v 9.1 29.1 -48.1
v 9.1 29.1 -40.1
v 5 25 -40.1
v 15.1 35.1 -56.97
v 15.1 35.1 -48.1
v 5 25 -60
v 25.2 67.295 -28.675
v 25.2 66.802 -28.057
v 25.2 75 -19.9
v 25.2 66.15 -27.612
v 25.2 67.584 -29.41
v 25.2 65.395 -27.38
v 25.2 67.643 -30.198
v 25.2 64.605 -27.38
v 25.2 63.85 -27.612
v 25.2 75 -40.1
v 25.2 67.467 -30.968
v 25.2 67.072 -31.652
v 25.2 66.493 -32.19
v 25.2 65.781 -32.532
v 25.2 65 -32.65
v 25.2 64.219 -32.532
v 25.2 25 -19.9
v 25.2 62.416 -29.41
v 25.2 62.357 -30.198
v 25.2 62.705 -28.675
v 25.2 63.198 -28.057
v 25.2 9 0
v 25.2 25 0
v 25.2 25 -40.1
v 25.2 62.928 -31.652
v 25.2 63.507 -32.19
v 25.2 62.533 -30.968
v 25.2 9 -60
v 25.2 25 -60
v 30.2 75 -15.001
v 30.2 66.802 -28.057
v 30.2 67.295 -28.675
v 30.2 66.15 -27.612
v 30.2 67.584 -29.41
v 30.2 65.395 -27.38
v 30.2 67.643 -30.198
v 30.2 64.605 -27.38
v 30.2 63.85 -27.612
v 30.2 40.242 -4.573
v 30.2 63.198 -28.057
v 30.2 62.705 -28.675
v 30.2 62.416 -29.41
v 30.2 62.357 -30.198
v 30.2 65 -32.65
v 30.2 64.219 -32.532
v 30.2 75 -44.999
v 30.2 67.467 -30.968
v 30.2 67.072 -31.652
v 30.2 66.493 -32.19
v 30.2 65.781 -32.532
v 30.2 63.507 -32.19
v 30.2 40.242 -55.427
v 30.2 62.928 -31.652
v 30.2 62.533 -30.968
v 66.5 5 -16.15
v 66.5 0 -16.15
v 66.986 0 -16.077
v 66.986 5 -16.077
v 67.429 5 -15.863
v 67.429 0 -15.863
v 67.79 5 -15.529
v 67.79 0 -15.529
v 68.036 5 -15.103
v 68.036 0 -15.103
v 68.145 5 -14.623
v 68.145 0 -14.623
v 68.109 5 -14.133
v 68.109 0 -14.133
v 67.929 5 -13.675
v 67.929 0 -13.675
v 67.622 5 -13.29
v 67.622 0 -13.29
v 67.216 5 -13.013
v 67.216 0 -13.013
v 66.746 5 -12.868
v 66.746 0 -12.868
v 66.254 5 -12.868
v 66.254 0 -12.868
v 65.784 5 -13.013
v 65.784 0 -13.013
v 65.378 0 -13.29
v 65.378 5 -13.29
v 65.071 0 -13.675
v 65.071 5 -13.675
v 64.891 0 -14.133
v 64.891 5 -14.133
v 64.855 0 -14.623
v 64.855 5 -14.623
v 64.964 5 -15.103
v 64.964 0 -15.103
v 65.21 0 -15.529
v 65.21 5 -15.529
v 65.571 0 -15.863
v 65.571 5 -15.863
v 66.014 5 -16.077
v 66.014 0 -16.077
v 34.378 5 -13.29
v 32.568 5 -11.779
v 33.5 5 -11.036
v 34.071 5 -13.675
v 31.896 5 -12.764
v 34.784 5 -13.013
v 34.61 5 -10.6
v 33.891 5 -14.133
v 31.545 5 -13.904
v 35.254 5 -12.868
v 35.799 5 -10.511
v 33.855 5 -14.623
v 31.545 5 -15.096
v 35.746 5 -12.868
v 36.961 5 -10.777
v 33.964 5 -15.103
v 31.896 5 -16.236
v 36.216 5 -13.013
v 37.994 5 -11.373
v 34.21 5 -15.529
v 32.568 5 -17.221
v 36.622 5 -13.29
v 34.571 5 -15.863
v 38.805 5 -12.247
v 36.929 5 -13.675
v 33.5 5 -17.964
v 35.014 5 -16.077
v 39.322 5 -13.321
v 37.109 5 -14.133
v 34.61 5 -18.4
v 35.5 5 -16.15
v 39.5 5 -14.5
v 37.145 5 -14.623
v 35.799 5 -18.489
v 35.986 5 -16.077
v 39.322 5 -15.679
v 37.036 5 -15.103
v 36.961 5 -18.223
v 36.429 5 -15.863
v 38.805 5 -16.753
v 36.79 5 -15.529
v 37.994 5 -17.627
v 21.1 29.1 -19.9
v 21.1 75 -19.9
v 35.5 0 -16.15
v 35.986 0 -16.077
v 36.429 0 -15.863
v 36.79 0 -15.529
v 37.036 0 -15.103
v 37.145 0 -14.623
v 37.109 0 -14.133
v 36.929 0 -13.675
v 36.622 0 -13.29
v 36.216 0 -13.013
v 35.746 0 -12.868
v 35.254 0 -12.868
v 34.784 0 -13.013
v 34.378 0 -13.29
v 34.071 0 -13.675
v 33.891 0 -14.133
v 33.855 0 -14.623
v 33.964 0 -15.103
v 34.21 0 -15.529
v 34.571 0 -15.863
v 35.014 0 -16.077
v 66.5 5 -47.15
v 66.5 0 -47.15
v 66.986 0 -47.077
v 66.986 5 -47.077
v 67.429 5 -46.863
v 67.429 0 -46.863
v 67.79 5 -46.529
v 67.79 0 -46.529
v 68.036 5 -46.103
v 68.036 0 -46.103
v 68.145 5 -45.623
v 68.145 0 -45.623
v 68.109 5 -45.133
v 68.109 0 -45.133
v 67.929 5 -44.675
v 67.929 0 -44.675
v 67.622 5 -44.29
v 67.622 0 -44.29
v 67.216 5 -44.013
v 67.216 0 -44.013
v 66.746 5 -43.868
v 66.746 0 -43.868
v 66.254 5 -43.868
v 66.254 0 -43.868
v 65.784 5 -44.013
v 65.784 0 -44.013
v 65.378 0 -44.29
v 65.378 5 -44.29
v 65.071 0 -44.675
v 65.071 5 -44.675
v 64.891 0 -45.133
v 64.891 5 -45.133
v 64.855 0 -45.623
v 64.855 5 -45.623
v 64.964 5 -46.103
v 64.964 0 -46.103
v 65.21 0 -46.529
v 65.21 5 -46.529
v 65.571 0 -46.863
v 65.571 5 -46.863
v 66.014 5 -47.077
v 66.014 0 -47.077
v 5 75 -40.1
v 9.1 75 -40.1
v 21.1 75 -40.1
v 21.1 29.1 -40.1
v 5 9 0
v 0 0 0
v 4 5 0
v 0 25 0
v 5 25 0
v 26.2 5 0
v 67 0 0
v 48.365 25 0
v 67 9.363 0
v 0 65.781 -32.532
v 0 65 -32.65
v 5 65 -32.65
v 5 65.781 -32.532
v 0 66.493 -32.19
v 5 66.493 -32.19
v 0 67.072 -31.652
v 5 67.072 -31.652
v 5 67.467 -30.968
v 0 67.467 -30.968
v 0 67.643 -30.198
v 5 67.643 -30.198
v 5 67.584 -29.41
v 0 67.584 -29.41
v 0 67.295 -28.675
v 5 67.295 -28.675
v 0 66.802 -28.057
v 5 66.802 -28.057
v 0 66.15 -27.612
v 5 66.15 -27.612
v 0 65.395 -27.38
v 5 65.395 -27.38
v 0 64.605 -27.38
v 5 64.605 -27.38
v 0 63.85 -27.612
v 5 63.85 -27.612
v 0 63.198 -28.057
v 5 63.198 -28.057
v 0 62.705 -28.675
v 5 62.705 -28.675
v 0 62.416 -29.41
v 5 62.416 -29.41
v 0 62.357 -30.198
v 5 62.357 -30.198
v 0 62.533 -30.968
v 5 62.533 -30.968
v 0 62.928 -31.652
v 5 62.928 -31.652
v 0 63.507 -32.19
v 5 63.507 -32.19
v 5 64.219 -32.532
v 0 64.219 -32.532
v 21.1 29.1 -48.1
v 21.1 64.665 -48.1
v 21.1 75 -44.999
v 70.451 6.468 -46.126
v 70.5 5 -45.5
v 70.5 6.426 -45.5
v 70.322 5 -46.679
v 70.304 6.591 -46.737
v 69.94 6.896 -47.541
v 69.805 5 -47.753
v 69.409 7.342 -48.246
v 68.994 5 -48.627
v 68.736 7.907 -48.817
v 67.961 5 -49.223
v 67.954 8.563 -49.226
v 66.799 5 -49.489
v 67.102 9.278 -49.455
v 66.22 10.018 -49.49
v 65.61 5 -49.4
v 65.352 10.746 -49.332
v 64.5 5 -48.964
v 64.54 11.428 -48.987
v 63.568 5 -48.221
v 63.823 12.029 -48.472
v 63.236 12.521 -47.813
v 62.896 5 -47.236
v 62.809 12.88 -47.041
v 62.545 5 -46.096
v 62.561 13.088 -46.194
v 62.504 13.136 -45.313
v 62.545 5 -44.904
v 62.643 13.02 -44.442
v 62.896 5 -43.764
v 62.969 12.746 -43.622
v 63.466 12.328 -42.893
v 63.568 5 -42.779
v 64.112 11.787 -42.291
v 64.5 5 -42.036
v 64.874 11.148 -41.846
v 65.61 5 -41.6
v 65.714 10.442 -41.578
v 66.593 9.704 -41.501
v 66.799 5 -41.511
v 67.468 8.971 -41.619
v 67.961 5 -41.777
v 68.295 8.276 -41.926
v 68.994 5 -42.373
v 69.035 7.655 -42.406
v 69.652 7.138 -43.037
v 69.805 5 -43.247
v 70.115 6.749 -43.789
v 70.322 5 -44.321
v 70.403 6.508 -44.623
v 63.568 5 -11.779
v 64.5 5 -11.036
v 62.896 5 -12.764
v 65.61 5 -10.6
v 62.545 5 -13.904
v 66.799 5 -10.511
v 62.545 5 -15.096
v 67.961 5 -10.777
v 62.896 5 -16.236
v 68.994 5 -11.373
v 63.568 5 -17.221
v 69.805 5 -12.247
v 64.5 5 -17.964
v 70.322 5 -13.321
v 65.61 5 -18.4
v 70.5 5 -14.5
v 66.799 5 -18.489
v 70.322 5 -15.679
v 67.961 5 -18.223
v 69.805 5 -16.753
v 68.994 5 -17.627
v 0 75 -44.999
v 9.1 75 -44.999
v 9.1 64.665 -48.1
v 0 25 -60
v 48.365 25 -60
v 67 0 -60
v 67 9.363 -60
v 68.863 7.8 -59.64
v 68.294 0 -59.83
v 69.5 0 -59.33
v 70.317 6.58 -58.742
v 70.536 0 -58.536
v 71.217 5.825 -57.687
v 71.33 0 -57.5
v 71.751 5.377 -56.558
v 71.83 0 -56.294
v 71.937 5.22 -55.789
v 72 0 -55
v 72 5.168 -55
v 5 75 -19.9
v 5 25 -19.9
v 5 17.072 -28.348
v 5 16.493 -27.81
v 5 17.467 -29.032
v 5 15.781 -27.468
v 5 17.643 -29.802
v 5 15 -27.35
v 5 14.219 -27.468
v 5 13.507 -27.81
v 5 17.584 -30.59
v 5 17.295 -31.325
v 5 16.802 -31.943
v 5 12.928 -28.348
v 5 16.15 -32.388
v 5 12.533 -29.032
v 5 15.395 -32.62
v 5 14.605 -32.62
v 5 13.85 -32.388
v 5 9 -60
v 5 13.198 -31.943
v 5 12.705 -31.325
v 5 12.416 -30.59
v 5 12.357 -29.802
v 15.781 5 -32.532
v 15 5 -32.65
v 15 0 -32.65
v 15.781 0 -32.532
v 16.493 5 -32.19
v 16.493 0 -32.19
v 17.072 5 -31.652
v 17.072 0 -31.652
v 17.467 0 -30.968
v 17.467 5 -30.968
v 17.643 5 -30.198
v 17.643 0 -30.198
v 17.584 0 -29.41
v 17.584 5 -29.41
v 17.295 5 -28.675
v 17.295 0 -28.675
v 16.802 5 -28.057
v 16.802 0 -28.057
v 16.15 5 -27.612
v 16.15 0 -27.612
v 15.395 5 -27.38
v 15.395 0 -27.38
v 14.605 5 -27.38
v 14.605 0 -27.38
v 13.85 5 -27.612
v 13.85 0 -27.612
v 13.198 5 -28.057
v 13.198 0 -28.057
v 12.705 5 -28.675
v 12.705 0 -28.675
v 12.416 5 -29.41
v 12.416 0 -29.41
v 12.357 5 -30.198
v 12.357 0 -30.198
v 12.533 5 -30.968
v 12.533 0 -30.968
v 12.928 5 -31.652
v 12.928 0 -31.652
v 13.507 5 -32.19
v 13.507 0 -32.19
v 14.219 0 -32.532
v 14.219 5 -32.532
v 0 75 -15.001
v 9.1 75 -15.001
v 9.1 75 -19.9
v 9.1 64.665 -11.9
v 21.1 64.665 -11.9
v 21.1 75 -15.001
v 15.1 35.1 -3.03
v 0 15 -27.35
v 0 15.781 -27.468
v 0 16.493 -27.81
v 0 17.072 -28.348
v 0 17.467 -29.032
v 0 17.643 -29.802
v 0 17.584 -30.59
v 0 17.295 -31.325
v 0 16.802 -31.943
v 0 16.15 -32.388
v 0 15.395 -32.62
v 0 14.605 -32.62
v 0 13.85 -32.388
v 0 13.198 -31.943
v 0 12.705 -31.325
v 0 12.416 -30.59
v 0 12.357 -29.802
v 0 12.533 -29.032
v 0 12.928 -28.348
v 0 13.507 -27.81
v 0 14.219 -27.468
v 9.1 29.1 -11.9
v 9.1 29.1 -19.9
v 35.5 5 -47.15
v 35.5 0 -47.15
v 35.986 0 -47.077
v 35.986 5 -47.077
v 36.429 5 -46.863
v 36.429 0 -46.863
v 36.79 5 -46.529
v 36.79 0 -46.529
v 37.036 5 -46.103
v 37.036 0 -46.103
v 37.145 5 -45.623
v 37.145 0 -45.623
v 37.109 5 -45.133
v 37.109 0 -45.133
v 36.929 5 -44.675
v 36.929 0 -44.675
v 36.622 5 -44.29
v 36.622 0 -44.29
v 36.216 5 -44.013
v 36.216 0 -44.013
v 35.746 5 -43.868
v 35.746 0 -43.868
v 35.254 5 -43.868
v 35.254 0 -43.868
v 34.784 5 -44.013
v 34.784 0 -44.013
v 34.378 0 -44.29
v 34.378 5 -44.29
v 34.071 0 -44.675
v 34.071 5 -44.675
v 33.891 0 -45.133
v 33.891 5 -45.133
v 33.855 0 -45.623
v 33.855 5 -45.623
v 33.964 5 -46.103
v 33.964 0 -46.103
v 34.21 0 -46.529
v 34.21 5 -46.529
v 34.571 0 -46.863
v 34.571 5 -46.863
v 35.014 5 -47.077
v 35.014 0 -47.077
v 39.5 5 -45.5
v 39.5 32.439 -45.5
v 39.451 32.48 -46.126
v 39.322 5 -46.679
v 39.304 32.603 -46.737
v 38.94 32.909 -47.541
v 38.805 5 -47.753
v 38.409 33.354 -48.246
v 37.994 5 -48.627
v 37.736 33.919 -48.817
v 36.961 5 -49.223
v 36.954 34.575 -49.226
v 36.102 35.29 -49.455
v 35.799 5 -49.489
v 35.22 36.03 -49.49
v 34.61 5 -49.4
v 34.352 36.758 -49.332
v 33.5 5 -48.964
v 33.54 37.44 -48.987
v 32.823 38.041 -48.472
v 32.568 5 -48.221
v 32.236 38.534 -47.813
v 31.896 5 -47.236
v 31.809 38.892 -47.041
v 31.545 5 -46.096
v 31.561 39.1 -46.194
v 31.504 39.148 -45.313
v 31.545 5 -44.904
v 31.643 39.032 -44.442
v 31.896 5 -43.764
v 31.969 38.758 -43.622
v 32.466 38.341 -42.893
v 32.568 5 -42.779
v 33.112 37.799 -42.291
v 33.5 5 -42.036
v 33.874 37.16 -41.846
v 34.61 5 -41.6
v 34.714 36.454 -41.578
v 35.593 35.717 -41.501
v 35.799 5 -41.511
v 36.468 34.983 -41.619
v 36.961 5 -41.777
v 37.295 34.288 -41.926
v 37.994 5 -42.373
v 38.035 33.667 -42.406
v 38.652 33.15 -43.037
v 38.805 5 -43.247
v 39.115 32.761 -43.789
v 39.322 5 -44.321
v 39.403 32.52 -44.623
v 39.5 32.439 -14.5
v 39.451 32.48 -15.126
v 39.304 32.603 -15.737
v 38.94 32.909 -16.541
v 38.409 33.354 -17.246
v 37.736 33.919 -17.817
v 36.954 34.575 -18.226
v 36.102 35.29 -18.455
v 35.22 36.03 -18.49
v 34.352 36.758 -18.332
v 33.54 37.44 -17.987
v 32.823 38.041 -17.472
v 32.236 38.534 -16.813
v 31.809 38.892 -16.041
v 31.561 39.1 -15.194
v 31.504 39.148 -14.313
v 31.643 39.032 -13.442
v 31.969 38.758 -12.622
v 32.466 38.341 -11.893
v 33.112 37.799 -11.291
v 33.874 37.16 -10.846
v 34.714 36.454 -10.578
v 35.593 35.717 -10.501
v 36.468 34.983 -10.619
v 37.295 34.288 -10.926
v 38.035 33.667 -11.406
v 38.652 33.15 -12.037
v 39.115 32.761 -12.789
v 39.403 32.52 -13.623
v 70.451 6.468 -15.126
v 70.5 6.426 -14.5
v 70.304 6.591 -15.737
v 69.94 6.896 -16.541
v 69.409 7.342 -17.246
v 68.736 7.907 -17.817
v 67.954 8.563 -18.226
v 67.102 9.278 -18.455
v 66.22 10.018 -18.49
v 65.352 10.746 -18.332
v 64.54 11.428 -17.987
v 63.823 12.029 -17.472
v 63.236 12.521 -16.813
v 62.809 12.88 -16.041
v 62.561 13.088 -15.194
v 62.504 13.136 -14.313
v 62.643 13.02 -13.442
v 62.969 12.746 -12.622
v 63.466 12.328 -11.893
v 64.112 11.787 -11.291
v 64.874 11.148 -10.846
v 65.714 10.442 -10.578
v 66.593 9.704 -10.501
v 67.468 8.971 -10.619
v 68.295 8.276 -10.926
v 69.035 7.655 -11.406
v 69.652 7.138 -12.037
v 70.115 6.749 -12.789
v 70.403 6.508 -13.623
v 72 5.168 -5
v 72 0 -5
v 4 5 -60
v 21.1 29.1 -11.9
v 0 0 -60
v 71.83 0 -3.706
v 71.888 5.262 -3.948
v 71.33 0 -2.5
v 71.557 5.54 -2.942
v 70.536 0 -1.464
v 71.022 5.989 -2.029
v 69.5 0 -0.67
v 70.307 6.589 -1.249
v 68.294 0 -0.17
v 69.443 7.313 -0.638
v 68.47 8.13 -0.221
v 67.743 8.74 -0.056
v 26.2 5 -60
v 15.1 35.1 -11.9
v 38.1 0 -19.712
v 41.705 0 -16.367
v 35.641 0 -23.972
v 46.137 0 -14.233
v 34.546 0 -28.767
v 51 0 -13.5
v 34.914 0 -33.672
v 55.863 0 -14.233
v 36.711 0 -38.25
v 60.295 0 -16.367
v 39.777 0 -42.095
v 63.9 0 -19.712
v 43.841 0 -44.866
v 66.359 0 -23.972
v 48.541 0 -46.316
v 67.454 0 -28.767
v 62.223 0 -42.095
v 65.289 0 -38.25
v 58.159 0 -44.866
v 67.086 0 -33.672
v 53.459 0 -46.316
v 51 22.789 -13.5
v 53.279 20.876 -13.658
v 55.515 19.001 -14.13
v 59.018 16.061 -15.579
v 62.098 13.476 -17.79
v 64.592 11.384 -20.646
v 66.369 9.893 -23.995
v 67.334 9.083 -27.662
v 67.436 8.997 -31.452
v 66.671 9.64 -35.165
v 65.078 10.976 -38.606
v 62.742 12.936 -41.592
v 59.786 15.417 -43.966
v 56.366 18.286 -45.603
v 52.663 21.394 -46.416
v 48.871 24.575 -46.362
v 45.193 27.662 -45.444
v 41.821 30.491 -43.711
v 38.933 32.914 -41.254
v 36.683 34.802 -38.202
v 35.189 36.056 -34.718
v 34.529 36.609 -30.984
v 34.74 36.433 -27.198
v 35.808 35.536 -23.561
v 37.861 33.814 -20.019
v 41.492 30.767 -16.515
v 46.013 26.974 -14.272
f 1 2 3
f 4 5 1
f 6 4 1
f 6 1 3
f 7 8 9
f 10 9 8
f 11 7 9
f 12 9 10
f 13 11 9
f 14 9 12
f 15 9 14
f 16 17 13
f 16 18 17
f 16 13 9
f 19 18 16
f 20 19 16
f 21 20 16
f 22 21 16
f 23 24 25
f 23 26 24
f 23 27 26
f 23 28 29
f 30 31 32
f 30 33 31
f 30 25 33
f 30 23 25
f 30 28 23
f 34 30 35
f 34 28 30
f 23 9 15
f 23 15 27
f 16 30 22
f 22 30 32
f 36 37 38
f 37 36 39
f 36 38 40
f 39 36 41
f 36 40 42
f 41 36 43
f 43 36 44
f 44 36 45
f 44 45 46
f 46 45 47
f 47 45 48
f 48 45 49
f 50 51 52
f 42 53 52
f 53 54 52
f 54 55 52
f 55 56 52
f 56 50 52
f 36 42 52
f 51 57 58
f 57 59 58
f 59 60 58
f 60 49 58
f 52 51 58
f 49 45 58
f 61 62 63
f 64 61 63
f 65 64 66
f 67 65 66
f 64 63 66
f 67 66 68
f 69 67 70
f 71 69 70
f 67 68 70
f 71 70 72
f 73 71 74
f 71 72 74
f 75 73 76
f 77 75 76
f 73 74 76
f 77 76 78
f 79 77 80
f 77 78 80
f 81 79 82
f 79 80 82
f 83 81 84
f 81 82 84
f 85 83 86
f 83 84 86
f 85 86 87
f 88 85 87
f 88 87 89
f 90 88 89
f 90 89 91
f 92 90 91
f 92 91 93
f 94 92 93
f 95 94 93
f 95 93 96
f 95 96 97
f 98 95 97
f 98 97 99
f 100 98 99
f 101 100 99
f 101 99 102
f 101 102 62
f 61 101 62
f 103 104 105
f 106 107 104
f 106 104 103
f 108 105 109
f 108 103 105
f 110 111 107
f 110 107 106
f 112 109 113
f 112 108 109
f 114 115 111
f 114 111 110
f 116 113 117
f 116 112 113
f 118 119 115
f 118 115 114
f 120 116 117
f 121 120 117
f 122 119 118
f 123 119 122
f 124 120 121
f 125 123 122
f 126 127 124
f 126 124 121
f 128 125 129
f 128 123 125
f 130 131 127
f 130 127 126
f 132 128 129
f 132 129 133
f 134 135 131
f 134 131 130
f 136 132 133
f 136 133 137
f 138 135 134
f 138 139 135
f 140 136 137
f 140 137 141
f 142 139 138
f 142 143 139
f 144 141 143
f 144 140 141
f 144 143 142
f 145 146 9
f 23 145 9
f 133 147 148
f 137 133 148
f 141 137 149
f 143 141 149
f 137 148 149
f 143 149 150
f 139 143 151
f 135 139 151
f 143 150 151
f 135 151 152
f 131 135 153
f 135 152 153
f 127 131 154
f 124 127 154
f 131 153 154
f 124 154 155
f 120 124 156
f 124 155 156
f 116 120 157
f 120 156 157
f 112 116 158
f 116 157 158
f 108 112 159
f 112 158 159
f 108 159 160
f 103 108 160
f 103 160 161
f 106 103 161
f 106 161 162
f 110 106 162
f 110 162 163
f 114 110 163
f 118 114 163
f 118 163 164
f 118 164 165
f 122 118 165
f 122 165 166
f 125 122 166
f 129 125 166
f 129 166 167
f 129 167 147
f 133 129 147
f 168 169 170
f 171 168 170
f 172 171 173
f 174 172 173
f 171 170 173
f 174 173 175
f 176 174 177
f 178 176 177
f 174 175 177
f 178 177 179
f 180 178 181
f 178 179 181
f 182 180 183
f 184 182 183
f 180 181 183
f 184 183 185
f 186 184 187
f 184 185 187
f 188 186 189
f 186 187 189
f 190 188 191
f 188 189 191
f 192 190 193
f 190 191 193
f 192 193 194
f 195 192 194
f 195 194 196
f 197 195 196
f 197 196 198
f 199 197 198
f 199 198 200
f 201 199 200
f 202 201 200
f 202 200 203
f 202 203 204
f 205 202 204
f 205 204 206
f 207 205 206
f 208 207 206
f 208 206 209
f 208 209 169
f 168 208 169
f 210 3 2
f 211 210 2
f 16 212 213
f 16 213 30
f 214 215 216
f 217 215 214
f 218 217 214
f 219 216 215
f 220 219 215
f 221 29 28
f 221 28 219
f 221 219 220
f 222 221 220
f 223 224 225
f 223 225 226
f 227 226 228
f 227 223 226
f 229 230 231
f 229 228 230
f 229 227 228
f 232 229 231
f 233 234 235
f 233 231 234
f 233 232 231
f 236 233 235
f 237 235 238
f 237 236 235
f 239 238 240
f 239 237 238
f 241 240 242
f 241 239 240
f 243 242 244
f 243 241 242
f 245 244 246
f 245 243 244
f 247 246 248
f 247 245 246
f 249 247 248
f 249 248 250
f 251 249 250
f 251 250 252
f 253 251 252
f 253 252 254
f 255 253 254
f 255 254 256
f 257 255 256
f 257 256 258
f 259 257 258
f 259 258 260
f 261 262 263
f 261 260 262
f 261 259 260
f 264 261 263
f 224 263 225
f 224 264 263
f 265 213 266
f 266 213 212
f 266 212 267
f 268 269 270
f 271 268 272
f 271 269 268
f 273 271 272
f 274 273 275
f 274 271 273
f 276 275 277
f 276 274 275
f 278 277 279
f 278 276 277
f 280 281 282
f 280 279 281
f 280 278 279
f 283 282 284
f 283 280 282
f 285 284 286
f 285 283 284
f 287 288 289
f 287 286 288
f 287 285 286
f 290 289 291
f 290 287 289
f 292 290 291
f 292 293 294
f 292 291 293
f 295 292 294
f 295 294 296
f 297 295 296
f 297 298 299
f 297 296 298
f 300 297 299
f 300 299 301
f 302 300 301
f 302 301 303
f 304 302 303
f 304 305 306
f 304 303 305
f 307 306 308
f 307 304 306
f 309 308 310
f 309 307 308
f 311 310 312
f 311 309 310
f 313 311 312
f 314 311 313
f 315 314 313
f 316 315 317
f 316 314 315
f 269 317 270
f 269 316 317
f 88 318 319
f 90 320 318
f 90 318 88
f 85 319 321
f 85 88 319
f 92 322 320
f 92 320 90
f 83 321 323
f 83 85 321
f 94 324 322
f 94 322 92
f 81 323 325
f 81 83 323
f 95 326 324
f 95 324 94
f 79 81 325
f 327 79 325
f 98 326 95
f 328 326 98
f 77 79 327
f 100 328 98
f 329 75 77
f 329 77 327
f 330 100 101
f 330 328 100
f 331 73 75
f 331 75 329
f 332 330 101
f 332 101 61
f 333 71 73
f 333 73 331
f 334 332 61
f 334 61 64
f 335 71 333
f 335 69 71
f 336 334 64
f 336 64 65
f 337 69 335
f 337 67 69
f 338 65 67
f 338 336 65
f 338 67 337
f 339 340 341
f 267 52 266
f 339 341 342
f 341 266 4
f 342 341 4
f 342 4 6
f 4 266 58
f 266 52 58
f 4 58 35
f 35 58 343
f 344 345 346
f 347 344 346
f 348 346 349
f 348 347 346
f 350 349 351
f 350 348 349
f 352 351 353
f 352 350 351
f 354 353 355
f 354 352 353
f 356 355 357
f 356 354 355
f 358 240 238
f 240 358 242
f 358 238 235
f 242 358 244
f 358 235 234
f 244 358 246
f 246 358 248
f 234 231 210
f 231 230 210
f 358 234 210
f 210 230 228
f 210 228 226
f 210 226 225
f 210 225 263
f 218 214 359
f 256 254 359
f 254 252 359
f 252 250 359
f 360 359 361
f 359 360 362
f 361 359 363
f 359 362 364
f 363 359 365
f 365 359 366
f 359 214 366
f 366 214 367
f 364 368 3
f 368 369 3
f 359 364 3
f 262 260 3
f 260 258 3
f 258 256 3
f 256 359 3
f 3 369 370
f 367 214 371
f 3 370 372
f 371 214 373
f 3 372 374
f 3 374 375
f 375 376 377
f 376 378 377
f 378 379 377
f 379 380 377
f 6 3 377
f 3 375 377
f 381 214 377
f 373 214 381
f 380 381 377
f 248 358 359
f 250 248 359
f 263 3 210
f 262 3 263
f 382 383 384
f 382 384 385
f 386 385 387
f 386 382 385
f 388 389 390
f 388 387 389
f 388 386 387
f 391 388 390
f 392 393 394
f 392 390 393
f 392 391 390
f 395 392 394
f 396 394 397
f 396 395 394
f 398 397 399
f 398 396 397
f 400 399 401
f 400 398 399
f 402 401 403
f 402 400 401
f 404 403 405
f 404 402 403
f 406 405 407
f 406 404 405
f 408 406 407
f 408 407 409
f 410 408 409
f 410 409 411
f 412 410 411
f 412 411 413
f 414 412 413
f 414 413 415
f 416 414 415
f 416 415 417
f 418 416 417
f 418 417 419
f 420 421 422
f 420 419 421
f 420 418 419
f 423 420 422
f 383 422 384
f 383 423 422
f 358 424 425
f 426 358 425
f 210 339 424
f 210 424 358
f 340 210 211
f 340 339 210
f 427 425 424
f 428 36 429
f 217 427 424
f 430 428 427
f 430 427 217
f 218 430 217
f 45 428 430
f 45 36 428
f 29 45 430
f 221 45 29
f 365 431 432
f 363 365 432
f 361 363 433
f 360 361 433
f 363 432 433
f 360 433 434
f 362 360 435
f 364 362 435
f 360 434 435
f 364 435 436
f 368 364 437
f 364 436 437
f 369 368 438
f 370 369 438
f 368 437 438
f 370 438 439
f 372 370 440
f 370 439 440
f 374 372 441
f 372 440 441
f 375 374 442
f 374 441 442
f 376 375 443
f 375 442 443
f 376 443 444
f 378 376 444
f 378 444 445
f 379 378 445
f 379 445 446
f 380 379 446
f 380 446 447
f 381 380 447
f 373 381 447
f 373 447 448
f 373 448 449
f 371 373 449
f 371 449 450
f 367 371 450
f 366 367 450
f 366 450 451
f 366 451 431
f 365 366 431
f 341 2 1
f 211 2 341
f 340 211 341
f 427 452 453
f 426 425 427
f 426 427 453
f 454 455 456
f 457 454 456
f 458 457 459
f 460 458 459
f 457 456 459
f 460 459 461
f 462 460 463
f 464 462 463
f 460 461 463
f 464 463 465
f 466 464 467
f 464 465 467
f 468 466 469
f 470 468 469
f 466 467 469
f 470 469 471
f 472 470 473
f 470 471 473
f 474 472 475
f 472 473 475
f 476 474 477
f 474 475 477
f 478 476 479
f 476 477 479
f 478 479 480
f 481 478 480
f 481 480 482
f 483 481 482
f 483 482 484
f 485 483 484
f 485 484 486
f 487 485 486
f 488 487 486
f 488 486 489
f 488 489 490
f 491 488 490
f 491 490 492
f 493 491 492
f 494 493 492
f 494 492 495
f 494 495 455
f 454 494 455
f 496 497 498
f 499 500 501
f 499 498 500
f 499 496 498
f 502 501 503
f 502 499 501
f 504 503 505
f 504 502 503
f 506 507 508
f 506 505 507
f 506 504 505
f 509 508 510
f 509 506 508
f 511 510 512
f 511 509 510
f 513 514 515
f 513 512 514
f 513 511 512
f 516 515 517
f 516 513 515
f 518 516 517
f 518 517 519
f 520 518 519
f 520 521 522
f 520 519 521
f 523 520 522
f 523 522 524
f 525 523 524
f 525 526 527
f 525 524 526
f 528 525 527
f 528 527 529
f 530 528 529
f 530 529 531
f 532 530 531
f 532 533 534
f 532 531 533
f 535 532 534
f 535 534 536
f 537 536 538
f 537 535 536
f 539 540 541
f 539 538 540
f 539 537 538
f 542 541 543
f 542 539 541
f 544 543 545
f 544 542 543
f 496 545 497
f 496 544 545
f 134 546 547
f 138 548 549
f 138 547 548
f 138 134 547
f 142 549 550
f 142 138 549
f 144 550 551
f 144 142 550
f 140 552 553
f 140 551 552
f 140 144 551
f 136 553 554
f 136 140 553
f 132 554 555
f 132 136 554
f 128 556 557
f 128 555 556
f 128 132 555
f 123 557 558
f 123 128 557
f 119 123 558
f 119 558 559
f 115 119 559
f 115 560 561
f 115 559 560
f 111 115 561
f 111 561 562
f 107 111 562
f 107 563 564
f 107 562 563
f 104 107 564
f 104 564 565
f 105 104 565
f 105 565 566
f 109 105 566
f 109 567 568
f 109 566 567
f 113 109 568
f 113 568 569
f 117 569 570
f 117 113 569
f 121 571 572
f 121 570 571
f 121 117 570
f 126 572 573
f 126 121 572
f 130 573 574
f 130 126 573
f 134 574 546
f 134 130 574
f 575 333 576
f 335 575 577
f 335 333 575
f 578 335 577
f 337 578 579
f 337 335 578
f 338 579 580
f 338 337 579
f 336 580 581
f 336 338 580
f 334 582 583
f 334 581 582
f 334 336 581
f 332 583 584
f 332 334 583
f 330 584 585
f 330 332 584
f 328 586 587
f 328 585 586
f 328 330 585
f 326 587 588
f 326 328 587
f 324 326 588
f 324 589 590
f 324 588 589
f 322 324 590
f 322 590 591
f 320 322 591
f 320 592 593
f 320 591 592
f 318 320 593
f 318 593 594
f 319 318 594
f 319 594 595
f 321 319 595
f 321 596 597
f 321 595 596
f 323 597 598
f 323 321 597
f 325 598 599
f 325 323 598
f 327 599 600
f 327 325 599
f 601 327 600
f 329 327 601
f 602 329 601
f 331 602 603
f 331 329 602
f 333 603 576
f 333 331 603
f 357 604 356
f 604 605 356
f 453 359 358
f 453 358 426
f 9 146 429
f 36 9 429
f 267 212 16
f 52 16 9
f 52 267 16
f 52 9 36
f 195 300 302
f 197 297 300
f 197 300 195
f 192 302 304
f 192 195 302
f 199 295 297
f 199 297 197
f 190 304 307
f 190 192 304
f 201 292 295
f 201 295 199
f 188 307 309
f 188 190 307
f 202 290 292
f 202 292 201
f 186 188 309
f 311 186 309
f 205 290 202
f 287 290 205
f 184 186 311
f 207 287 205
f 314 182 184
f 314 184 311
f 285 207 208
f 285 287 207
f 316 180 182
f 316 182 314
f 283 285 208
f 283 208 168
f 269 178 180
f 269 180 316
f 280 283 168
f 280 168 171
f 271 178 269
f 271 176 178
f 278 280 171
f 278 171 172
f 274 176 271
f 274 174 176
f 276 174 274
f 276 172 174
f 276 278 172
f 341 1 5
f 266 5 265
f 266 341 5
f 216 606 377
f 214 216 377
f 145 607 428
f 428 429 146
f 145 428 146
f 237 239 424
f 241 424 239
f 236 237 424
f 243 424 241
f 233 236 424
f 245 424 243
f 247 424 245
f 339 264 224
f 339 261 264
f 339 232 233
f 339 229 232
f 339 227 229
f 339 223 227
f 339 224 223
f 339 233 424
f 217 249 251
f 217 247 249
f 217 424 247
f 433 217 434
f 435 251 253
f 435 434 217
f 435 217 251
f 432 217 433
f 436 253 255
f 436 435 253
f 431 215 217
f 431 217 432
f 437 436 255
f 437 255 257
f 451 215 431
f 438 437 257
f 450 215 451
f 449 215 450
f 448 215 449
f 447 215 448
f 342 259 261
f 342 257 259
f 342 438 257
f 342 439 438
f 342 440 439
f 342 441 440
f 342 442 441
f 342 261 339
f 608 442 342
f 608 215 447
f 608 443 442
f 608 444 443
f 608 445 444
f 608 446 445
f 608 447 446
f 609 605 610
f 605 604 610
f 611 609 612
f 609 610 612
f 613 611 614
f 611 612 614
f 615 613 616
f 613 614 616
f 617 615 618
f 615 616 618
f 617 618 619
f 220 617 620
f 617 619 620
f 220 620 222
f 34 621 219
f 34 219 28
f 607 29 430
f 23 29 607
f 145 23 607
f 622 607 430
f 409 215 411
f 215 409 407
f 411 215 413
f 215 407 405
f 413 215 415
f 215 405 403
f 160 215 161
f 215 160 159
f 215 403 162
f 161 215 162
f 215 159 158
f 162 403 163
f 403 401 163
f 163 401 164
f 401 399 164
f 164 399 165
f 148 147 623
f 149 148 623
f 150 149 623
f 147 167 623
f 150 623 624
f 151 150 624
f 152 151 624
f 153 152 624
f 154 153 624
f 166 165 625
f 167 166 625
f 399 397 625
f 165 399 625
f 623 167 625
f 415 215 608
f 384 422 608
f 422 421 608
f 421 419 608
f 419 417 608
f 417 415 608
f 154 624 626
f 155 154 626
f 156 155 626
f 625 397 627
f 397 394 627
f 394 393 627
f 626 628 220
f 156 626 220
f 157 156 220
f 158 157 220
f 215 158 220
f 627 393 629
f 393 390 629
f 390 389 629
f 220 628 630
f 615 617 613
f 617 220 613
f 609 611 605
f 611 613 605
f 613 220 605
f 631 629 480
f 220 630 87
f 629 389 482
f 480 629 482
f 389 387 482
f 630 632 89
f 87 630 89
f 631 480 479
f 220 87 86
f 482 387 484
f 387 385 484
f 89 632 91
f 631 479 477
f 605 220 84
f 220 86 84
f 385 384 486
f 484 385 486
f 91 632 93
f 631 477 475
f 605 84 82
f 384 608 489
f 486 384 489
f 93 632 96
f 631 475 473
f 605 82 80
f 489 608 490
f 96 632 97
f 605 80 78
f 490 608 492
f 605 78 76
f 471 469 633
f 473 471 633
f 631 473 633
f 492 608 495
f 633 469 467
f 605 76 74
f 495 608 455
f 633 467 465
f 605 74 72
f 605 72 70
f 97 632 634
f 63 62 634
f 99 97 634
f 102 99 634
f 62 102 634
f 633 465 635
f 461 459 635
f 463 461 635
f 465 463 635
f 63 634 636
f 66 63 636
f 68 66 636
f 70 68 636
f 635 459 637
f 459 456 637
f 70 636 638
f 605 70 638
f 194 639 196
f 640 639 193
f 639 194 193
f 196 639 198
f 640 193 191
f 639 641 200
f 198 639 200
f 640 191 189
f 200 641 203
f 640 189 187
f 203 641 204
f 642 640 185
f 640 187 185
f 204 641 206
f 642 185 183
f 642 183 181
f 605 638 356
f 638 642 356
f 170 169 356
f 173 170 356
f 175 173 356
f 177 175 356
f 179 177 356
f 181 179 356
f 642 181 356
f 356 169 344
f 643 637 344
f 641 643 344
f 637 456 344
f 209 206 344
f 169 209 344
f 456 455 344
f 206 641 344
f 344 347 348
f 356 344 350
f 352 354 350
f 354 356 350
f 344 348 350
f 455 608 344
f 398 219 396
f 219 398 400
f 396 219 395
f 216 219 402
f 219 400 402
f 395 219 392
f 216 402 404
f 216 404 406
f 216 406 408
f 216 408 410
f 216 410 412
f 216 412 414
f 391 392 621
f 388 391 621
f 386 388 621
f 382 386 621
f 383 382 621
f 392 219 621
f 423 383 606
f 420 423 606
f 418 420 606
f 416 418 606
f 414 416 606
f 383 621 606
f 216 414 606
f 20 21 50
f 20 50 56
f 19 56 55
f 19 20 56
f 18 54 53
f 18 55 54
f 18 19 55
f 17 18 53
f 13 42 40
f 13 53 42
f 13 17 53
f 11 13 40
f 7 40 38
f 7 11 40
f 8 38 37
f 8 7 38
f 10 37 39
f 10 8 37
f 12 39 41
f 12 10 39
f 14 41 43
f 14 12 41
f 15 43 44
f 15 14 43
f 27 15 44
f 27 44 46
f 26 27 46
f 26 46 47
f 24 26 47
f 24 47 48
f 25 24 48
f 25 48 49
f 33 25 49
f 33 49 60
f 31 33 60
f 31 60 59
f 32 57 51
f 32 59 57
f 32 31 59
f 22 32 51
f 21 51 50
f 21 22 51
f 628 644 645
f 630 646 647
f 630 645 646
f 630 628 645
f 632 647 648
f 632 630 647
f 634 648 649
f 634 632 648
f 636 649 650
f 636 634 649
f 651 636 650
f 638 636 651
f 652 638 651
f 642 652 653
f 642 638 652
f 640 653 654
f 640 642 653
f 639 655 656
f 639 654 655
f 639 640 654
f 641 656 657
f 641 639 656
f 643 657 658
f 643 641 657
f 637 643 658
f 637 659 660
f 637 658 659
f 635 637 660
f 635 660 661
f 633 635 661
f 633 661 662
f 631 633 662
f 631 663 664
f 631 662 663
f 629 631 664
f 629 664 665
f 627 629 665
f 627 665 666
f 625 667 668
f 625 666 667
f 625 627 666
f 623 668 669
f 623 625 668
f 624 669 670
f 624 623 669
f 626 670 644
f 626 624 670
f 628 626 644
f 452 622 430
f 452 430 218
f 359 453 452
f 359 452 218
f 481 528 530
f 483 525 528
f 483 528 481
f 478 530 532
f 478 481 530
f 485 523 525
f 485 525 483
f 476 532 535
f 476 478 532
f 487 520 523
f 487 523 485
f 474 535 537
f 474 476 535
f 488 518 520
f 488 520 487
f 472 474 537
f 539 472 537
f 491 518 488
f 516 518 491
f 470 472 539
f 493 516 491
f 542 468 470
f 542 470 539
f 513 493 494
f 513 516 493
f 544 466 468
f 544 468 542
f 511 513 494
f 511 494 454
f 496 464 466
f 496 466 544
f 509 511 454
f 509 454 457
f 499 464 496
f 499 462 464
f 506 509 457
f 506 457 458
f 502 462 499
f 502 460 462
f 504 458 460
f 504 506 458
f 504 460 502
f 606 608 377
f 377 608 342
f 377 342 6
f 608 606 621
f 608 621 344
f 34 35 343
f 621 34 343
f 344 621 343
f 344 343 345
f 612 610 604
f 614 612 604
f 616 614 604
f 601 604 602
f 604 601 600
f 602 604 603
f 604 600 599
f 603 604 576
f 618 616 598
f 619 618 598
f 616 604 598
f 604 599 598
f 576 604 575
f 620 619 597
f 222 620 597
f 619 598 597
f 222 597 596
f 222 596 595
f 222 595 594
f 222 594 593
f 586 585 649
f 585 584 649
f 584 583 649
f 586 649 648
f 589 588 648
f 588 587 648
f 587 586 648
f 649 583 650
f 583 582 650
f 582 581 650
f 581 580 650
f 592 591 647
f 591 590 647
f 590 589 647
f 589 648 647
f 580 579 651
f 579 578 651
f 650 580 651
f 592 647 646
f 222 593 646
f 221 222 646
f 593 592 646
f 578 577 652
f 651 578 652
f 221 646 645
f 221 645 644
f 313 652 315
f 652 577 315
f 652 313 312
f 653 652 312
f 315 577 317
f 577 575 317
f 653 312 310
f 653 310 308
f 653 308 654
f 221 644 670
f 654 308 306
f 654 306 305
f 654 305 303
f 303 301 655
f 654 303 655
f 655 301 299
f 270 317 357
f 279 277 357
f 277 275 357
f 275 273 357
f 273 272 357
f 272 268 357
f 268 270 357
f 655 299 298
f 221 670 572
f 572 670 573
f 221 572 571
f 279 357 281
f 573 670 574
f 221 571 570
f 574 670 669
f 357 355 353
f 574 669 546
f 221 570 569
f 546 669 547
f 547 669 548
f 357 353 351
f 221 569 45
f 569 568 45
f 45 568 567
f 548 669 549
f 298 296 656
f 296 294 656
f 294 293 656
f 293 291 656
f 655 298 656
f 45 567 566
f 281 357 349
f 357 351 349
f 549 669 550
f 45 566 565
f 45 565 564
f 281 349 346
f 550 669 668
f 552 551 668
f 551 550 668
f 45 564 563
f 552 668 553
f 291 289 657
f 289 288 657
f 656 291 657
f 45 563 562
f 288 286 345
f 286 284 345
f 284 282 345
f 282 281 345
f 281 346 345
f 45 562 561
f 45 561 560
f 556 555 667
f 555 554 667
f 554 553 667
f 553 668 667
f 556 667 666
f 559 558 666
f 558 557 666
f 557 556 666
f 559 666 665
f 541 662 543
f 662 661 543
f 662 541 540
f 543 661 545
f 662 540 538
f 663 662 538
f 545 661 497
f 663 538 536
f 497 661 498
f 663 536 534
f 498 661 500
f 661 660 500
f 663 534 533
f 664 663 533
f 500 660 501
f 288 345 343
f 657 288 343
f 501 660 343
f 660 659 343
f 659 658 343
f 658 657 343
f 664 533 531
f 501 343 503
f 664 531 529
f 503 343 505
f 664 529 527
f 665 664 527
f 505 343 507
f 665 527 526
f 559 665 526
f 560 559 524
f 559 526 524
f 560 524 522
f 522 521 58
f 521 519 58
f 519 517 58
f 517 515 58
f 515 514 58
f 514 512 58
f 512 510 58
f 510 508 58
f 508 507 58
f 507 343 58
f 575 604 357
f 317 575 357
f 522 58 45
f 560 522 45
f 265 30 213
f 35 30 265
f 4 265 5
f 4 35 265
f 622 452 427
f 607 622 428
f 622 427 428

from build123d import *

# Parameters (mm, degrees)
SKETCH1_W               = 72
SKETCH1_H               = 60
BOSS_EXTRUDE1_DEPTH     = 5
SKETCH2_W               = 5
SKETCH2_H               = 60
BOSS_EXTRUDE2_DEPTH     = 70
SKETCH3_W               = 5
SKETCH3_H               = 60
BOSS_EXTRUDE3_DEPTH     = 70
BOSS_EXTRUDE4_DEPTH     = 60
CHAMFER1_SIZE           = 42
CHAMFER1_SIZE_2         = 35.242184509
CHAMFER2_SIZE           = 15.000718891
CHAMFER2_SIZE_2         = 50
SKETCH12_W              = 20.2
SKETCH12_H              = 20.2
CUT_EXTRUDE8_DEPTH      = 67
CUT_EXTRUDE1_DEPTH      = 117.978630527
CUT_EXTRUDE1_DEPTH_BACK = 117.978630527
SKETCH5_R               = 16.5
SKETCH6_R               = 1.65
CUT_EXTRUDE2_DEPTH      = 121.037494142
SKETCH7_R               = 4
CUT_EXTRUDE4_DEPTH      = 117.978630527
CUT_EXTRUDE5_DEPTH      = 105.748460609
CUT_EXTRUDE5_DEPTH_BACK = 105.748460609
SKETCH8_R               = 2.65
CUT_EXTRUDE6_DEPTH      = 121.037494142
CUT_EXTRUDE6_DEPTH_BACK = 121.037494142
SKETCH9_R               = 2.65
FILLET1_R               = 5
SKETCH10_R              = 2.65
CUT_EXTRUDE7_DEPTH      = 10
CUT_EXTRUDE9_DEPTH      = 121.037494142
CUT_EXTRUDE9_DEPTH_BACK = 121.037494142
CUT_EXTRUDE10_REACH     = 122.037
SKETCH14_W              = 12
SKETCH14_H              = 8


with BuildPart() as part:
    # Sketch1 → Boss-Extrude1 (new body)
    with BuildSketch(Plane(origin=(0, 0, 0), x_dir=(1, 0, 0), z_dir=(0, 1, 0))):
        with Locations((36, 30)):
            Rectangle(SKETCH1_W, SKETCH1_H)
    extrude(amount=BOSS_EXTRUDE1_DEPTH)

    # Sketch2 → Boss-Extrude2 (add)
    with BuildSketch(Plane(origin=(0, 5, 0), x_dir=(1, 0, 0), z_dir=(0, 1, 0))):
        with Locations((2.5, 30)):
            Rectangle(SKETCH2_W, SKETCH2_H)
    extrude(amount=BOSS_EXTRUDE2_DEPTH)

    # Sketch3 → Boss-Extrude3 (add)
    with BuildSketch(Plane(origin=(0, 5, 0), x_dir=(1, 0, 0), z_dir=(0, 1, 0))):
        with Locations((27.7, 30)):
            Rectangle(SKETCH3_W, SKETCH3_H)
    extrude(amount=BOSS_EXTRUDE3_DEPTH)

    # Sketch11 → Boss-Extrude4 (add)
    with BuildSketch(Plane(origin=(0, 0, -60), x_dir=(-1, 0, 0), z_dir=(0, 0, -1))):
        Polygon((-25.2, 25), (-15.1, 35.1), (-5, 25), (-5, 75), (-25.2, 75), align=None)
    extrude(amount=-BOSS_EXTRUDE4_DEPTH)

    # Chamfer1
    # the kernel refuses this chamfer: 42, 35.242184509 mm, written as the material it adds along each edge
    with BuildSketch(Plane(origin=(30.2, 5, -60), x_dir=(0.9996889667359942, -0.02493932209023436, 0), z_dir=(0, 0, 1))) as chamfer1_piece_1_section:
        Polygon((CHAMFER1_SIZE * 0.999688966736, CHAMFER1_SIZE * 0.0249393220902), (-CHAMFER1_SIZE_2 * 0.0249393220905, CHAMFER1_SIZE_2 * 0.999688966749), (0, 0), align=None)
    chamfer1_piece_1 = extrude(amount=60, mode=Mode.PRIVATE)
    chamfer1_piece_1 = split(chamfer1_piece_1, bisect_by=Plane(origin=(72, 16.573415306, -30), z_dir=(-1, 0, 0)), keep=Keep.TOP, mode=Mode.PRIVATE)
    add(chamfer1_piece_1)

    # Chamfer2
    # the kernel refuses this chamfer: 50, 15.000718891 mm, written as the material it takes off along each edge
    with BuildSketch(Plane(origin=(159.997065138, 75, -60), x_dir=(0, 0.12207157319780576, 0.9925213000318999), z_dir=(-1, 0, 0))) as chamfer2_piece_1:
        Polygon((CHAMFER2_SIZE * 0.99252130002, -CHAMFER2_SIZE * 0.122071573196), (-CHAMFER2_SIZE_2 * 0.122071573198, -CHAMFER2_SIZE_2 * 0.992521300032), (0, 0), align=None)
    extrude(amount=289.794130277, mode=Mode.SUBTRACT)
    with BuildSketch(Plane(origin=(159.997065138, 75, 0), x_dir=(0, 0.12207157319780576, -0.9925213000318999), z_dir=(-1, 0, 0))) as chamfer2_piece_2:
        Polygon((CHAMFER2_SIZE * 0.99252130002, CHAMFER2_SIZE * 0.122071573196), (-CHAMFER2_SIZE_2 * 0.122071573198, CHAMFER2_SIZE_2 * 0.992521300032), (0, 0), align=None)
    extrude(amount=289.794130277, mode=Mode.SUBTRACT)

    # Sketch12 → Cut-Extrude8 (cut)
    with BuildSketch(Plane(origin=(0, 75, 0), x_dir=(1, 0, 0), z_dir=(0, 1, 0))):
        with Locations((15.1, 30)):
            Rectangle(SKETCH12_W, SKETCH12_H)
    extrude(amount=-CUT_EXTRUDE8_DEPTH, mode=Mode.SUBTRACT)

    # Sketch5 → Cut-Extrude1 (cut, two sides: drawn at the far end of the back side and taken through both)
    with BuildSketch(Plane(origin=(0, 5, 0), x_dir=(1, 0, 0), z_dir=(0, 1, 0)).offset(-CUT_EXTRUDE1_DEPTH_BACK)):
        with Locations(Location((51, 30, 0), (0, 0, 270))):
            Circle(SKETCH5_R)
    extrude(amount=CUT_EXTRUDE1_DEPTH + CUT_EXTRUDE1_DEPTH_BACK, mode=Mode.SUBTRACT)

    # Sketch6 → Cut-Extrude2 (cut, through all)
    with BuildSketch(Plane.XZ):
        with Locations(Location((66.5, -14.5, 0), (0, 0, 270))):
            Circle(SKETCH6_R)
        with Locations(Location((66.5, -45.5, 0), (0, 0, 270))):
            Circle(SKETCH6_R)
        with Locations(Location((35.5, -45.5, 0), (0, 0, 270))):
            Circle(SKETCH6_R)
        with Locations(Location((35.5, -14.5, 0), (0, 0, 270))):
            Circle(SKETCH6_R)
    extrude(amount=-CUT_EXTRUDE2_DEPTH, mode=Mode.SUBTRACT)

    # Sketch7 → Cut-Extrude4 (cut, through all)
    with BuildSketch(Plane(origin=(0, 5, 0), x_dir=(1, 0, 0), z_dir=(0, 1, 0))):
        with Locations((66.5, 45.5)):
            Circle(SKETCH7_R)
        with Locations((66.5, 14.5)):
            Circle(SKETCH7_R)
        with Locations((35.5, 14.5)):
            Circle(SKETCH7_R)
        with Locations((35.5, 45.5)):
            Circle(SKETCH7_R)
    extrude(amount=CUT_EXTRUDE4_DEPTH, mode=Mode.SUBTRACT)

    # Sketch8 → Cut-Extrude5 (cut, two sides: drawn at the far end of the back side and taken through both)
    with BuildSketch(Plane(origin=(30.2, 0, 0), x_dir=(0, 0, -1), z_dir=(1, 0, 0)).offset(-CUT_EXTRUDE5_DEPTH_BACK)):
        with Locations((30, 65)):
            Circle(SKETCH8_R)
    extrude(amount=CUT_EXTRUDE5_DEPTH + CUT_EXTRUDE5_DEPTH_BACK, mode=Mode.SUBTRACT)

    # Sketch9 → Cut-Extrude6 (cut, two sides: drawn at the far end of the back side and taken through both)
    with BuildSketch(Plane.XZ.offset(-CUT_EXTRUDE6_DEPTH_BACK)):
        with Locations(Location((15, -30, 0), (0, 0, 270))):
            Circle(SKETCH9_R)
    extrude(amount=CUT_EXTRUDE6_DEPTH + CUT_EXTRUDE6_DEPTH_BACK, mode=Mode.SUBTRACT)

    # Fillet1
    fillet1_edges = [part.edges().sort_by_distance(p)[0] for p in [
        (72, 2.583909963, -60),
        (72, 2.583909963, 0),
    ]]
    fillet(fillet1_edges, radius=FILLET1_R)

    # Sketch10 → Cut-Extrude7 (cut)
    with BuildSketch(Plane.ZY):
        with Locations((-30, 15)):
            Circle(SKETCH10_R)
    extrude(amount=-CUT_EXTRUDE7_DEPTH, mode=Mode.SUBTRACT)

    # Sketch13 → Cut-Extrude9 (cut, two sides: drawn at the far end of the back side and taken through both)
    with BuildSketch(Plane.XY.offset(-CUT_EXTRUDE9_DEPTH_BACK)):
        Polygon((5, 5), (4, 5), (5, 9), align=None)
        Polygon((25.2, 5), (26.2, 5), (25.2, 9), align=None)
    extrude(amount=CUT_EXTRUDE9_DEPTH + CUT_EXTRUDE9_DEPTH_BACK, mode=Mode.SUBTRACT)

    # Cut-Extrude10: up to this face of the body (flat: up to its plane)
    cut_extrude10_end = Plane(part.part.faces().sort_by_distance((15.1, 5, -59.366909169))[0])
    # Sketch14 → Cut-Extrude10 (cut, up to the picked face)
    with BuildSketch(Plane(origin=(0, 75, 0), x_dir=(1, 0, 0), z_dir=(0, 1, 0)), mode=Mode.PRIVATE) as cut_extrude10_sk1:
        with Locations((15.1, 44.1)):
            Rectangle(SKETCH14_W, SKETCH14_H)
    cut_extrude10_tool1 = split(extrude(cut_extrude10_sk1.sketch, amount=-CUT_EXTRUDE10_REACH, mode=Mode.PRIVATE), bisect_by=cut_extrude10_end, keep=Keep.BOTH, mode=Mode.PRIVATE)
    # Sketch14 → Cut-Extrude10 (cut, up to the picked face)
    with BuildSketch(Plane(origin=(0, 75, 0), x_dir=(1, 0, 0), z_dir=(0, 1, 0)), mode=Mode.PRIVATE) as cut_extrude10_sk2:
        with Locations((15.1, 15.9)):
            Rectangle(SKETCH14_W, SKETCH14_H)
    cut_extrude10_tool2 = split(extrude(cut_extrude10_sk2.sketch, amount=-CUT_EXTRUDE10_REACH, mode=Mode.PRIVATE), bisect_by=cut_extrude10_end, keep=Keep.BOTH, mode=Mode.PRIVATE)
    add(cut_extrude10_tool1.solids().sort_by(Axis((15.1, 75, -44.1), (0, -1, 0)))[0], mode=Mode.SUBTRACT)
    add(cut_extrude10_tool2.solids().sort_by(Axis((15.1, 75, -15.9), (0, -1, 0)))[0], mode=Mode.SUBTRACT)


solid = part.part
